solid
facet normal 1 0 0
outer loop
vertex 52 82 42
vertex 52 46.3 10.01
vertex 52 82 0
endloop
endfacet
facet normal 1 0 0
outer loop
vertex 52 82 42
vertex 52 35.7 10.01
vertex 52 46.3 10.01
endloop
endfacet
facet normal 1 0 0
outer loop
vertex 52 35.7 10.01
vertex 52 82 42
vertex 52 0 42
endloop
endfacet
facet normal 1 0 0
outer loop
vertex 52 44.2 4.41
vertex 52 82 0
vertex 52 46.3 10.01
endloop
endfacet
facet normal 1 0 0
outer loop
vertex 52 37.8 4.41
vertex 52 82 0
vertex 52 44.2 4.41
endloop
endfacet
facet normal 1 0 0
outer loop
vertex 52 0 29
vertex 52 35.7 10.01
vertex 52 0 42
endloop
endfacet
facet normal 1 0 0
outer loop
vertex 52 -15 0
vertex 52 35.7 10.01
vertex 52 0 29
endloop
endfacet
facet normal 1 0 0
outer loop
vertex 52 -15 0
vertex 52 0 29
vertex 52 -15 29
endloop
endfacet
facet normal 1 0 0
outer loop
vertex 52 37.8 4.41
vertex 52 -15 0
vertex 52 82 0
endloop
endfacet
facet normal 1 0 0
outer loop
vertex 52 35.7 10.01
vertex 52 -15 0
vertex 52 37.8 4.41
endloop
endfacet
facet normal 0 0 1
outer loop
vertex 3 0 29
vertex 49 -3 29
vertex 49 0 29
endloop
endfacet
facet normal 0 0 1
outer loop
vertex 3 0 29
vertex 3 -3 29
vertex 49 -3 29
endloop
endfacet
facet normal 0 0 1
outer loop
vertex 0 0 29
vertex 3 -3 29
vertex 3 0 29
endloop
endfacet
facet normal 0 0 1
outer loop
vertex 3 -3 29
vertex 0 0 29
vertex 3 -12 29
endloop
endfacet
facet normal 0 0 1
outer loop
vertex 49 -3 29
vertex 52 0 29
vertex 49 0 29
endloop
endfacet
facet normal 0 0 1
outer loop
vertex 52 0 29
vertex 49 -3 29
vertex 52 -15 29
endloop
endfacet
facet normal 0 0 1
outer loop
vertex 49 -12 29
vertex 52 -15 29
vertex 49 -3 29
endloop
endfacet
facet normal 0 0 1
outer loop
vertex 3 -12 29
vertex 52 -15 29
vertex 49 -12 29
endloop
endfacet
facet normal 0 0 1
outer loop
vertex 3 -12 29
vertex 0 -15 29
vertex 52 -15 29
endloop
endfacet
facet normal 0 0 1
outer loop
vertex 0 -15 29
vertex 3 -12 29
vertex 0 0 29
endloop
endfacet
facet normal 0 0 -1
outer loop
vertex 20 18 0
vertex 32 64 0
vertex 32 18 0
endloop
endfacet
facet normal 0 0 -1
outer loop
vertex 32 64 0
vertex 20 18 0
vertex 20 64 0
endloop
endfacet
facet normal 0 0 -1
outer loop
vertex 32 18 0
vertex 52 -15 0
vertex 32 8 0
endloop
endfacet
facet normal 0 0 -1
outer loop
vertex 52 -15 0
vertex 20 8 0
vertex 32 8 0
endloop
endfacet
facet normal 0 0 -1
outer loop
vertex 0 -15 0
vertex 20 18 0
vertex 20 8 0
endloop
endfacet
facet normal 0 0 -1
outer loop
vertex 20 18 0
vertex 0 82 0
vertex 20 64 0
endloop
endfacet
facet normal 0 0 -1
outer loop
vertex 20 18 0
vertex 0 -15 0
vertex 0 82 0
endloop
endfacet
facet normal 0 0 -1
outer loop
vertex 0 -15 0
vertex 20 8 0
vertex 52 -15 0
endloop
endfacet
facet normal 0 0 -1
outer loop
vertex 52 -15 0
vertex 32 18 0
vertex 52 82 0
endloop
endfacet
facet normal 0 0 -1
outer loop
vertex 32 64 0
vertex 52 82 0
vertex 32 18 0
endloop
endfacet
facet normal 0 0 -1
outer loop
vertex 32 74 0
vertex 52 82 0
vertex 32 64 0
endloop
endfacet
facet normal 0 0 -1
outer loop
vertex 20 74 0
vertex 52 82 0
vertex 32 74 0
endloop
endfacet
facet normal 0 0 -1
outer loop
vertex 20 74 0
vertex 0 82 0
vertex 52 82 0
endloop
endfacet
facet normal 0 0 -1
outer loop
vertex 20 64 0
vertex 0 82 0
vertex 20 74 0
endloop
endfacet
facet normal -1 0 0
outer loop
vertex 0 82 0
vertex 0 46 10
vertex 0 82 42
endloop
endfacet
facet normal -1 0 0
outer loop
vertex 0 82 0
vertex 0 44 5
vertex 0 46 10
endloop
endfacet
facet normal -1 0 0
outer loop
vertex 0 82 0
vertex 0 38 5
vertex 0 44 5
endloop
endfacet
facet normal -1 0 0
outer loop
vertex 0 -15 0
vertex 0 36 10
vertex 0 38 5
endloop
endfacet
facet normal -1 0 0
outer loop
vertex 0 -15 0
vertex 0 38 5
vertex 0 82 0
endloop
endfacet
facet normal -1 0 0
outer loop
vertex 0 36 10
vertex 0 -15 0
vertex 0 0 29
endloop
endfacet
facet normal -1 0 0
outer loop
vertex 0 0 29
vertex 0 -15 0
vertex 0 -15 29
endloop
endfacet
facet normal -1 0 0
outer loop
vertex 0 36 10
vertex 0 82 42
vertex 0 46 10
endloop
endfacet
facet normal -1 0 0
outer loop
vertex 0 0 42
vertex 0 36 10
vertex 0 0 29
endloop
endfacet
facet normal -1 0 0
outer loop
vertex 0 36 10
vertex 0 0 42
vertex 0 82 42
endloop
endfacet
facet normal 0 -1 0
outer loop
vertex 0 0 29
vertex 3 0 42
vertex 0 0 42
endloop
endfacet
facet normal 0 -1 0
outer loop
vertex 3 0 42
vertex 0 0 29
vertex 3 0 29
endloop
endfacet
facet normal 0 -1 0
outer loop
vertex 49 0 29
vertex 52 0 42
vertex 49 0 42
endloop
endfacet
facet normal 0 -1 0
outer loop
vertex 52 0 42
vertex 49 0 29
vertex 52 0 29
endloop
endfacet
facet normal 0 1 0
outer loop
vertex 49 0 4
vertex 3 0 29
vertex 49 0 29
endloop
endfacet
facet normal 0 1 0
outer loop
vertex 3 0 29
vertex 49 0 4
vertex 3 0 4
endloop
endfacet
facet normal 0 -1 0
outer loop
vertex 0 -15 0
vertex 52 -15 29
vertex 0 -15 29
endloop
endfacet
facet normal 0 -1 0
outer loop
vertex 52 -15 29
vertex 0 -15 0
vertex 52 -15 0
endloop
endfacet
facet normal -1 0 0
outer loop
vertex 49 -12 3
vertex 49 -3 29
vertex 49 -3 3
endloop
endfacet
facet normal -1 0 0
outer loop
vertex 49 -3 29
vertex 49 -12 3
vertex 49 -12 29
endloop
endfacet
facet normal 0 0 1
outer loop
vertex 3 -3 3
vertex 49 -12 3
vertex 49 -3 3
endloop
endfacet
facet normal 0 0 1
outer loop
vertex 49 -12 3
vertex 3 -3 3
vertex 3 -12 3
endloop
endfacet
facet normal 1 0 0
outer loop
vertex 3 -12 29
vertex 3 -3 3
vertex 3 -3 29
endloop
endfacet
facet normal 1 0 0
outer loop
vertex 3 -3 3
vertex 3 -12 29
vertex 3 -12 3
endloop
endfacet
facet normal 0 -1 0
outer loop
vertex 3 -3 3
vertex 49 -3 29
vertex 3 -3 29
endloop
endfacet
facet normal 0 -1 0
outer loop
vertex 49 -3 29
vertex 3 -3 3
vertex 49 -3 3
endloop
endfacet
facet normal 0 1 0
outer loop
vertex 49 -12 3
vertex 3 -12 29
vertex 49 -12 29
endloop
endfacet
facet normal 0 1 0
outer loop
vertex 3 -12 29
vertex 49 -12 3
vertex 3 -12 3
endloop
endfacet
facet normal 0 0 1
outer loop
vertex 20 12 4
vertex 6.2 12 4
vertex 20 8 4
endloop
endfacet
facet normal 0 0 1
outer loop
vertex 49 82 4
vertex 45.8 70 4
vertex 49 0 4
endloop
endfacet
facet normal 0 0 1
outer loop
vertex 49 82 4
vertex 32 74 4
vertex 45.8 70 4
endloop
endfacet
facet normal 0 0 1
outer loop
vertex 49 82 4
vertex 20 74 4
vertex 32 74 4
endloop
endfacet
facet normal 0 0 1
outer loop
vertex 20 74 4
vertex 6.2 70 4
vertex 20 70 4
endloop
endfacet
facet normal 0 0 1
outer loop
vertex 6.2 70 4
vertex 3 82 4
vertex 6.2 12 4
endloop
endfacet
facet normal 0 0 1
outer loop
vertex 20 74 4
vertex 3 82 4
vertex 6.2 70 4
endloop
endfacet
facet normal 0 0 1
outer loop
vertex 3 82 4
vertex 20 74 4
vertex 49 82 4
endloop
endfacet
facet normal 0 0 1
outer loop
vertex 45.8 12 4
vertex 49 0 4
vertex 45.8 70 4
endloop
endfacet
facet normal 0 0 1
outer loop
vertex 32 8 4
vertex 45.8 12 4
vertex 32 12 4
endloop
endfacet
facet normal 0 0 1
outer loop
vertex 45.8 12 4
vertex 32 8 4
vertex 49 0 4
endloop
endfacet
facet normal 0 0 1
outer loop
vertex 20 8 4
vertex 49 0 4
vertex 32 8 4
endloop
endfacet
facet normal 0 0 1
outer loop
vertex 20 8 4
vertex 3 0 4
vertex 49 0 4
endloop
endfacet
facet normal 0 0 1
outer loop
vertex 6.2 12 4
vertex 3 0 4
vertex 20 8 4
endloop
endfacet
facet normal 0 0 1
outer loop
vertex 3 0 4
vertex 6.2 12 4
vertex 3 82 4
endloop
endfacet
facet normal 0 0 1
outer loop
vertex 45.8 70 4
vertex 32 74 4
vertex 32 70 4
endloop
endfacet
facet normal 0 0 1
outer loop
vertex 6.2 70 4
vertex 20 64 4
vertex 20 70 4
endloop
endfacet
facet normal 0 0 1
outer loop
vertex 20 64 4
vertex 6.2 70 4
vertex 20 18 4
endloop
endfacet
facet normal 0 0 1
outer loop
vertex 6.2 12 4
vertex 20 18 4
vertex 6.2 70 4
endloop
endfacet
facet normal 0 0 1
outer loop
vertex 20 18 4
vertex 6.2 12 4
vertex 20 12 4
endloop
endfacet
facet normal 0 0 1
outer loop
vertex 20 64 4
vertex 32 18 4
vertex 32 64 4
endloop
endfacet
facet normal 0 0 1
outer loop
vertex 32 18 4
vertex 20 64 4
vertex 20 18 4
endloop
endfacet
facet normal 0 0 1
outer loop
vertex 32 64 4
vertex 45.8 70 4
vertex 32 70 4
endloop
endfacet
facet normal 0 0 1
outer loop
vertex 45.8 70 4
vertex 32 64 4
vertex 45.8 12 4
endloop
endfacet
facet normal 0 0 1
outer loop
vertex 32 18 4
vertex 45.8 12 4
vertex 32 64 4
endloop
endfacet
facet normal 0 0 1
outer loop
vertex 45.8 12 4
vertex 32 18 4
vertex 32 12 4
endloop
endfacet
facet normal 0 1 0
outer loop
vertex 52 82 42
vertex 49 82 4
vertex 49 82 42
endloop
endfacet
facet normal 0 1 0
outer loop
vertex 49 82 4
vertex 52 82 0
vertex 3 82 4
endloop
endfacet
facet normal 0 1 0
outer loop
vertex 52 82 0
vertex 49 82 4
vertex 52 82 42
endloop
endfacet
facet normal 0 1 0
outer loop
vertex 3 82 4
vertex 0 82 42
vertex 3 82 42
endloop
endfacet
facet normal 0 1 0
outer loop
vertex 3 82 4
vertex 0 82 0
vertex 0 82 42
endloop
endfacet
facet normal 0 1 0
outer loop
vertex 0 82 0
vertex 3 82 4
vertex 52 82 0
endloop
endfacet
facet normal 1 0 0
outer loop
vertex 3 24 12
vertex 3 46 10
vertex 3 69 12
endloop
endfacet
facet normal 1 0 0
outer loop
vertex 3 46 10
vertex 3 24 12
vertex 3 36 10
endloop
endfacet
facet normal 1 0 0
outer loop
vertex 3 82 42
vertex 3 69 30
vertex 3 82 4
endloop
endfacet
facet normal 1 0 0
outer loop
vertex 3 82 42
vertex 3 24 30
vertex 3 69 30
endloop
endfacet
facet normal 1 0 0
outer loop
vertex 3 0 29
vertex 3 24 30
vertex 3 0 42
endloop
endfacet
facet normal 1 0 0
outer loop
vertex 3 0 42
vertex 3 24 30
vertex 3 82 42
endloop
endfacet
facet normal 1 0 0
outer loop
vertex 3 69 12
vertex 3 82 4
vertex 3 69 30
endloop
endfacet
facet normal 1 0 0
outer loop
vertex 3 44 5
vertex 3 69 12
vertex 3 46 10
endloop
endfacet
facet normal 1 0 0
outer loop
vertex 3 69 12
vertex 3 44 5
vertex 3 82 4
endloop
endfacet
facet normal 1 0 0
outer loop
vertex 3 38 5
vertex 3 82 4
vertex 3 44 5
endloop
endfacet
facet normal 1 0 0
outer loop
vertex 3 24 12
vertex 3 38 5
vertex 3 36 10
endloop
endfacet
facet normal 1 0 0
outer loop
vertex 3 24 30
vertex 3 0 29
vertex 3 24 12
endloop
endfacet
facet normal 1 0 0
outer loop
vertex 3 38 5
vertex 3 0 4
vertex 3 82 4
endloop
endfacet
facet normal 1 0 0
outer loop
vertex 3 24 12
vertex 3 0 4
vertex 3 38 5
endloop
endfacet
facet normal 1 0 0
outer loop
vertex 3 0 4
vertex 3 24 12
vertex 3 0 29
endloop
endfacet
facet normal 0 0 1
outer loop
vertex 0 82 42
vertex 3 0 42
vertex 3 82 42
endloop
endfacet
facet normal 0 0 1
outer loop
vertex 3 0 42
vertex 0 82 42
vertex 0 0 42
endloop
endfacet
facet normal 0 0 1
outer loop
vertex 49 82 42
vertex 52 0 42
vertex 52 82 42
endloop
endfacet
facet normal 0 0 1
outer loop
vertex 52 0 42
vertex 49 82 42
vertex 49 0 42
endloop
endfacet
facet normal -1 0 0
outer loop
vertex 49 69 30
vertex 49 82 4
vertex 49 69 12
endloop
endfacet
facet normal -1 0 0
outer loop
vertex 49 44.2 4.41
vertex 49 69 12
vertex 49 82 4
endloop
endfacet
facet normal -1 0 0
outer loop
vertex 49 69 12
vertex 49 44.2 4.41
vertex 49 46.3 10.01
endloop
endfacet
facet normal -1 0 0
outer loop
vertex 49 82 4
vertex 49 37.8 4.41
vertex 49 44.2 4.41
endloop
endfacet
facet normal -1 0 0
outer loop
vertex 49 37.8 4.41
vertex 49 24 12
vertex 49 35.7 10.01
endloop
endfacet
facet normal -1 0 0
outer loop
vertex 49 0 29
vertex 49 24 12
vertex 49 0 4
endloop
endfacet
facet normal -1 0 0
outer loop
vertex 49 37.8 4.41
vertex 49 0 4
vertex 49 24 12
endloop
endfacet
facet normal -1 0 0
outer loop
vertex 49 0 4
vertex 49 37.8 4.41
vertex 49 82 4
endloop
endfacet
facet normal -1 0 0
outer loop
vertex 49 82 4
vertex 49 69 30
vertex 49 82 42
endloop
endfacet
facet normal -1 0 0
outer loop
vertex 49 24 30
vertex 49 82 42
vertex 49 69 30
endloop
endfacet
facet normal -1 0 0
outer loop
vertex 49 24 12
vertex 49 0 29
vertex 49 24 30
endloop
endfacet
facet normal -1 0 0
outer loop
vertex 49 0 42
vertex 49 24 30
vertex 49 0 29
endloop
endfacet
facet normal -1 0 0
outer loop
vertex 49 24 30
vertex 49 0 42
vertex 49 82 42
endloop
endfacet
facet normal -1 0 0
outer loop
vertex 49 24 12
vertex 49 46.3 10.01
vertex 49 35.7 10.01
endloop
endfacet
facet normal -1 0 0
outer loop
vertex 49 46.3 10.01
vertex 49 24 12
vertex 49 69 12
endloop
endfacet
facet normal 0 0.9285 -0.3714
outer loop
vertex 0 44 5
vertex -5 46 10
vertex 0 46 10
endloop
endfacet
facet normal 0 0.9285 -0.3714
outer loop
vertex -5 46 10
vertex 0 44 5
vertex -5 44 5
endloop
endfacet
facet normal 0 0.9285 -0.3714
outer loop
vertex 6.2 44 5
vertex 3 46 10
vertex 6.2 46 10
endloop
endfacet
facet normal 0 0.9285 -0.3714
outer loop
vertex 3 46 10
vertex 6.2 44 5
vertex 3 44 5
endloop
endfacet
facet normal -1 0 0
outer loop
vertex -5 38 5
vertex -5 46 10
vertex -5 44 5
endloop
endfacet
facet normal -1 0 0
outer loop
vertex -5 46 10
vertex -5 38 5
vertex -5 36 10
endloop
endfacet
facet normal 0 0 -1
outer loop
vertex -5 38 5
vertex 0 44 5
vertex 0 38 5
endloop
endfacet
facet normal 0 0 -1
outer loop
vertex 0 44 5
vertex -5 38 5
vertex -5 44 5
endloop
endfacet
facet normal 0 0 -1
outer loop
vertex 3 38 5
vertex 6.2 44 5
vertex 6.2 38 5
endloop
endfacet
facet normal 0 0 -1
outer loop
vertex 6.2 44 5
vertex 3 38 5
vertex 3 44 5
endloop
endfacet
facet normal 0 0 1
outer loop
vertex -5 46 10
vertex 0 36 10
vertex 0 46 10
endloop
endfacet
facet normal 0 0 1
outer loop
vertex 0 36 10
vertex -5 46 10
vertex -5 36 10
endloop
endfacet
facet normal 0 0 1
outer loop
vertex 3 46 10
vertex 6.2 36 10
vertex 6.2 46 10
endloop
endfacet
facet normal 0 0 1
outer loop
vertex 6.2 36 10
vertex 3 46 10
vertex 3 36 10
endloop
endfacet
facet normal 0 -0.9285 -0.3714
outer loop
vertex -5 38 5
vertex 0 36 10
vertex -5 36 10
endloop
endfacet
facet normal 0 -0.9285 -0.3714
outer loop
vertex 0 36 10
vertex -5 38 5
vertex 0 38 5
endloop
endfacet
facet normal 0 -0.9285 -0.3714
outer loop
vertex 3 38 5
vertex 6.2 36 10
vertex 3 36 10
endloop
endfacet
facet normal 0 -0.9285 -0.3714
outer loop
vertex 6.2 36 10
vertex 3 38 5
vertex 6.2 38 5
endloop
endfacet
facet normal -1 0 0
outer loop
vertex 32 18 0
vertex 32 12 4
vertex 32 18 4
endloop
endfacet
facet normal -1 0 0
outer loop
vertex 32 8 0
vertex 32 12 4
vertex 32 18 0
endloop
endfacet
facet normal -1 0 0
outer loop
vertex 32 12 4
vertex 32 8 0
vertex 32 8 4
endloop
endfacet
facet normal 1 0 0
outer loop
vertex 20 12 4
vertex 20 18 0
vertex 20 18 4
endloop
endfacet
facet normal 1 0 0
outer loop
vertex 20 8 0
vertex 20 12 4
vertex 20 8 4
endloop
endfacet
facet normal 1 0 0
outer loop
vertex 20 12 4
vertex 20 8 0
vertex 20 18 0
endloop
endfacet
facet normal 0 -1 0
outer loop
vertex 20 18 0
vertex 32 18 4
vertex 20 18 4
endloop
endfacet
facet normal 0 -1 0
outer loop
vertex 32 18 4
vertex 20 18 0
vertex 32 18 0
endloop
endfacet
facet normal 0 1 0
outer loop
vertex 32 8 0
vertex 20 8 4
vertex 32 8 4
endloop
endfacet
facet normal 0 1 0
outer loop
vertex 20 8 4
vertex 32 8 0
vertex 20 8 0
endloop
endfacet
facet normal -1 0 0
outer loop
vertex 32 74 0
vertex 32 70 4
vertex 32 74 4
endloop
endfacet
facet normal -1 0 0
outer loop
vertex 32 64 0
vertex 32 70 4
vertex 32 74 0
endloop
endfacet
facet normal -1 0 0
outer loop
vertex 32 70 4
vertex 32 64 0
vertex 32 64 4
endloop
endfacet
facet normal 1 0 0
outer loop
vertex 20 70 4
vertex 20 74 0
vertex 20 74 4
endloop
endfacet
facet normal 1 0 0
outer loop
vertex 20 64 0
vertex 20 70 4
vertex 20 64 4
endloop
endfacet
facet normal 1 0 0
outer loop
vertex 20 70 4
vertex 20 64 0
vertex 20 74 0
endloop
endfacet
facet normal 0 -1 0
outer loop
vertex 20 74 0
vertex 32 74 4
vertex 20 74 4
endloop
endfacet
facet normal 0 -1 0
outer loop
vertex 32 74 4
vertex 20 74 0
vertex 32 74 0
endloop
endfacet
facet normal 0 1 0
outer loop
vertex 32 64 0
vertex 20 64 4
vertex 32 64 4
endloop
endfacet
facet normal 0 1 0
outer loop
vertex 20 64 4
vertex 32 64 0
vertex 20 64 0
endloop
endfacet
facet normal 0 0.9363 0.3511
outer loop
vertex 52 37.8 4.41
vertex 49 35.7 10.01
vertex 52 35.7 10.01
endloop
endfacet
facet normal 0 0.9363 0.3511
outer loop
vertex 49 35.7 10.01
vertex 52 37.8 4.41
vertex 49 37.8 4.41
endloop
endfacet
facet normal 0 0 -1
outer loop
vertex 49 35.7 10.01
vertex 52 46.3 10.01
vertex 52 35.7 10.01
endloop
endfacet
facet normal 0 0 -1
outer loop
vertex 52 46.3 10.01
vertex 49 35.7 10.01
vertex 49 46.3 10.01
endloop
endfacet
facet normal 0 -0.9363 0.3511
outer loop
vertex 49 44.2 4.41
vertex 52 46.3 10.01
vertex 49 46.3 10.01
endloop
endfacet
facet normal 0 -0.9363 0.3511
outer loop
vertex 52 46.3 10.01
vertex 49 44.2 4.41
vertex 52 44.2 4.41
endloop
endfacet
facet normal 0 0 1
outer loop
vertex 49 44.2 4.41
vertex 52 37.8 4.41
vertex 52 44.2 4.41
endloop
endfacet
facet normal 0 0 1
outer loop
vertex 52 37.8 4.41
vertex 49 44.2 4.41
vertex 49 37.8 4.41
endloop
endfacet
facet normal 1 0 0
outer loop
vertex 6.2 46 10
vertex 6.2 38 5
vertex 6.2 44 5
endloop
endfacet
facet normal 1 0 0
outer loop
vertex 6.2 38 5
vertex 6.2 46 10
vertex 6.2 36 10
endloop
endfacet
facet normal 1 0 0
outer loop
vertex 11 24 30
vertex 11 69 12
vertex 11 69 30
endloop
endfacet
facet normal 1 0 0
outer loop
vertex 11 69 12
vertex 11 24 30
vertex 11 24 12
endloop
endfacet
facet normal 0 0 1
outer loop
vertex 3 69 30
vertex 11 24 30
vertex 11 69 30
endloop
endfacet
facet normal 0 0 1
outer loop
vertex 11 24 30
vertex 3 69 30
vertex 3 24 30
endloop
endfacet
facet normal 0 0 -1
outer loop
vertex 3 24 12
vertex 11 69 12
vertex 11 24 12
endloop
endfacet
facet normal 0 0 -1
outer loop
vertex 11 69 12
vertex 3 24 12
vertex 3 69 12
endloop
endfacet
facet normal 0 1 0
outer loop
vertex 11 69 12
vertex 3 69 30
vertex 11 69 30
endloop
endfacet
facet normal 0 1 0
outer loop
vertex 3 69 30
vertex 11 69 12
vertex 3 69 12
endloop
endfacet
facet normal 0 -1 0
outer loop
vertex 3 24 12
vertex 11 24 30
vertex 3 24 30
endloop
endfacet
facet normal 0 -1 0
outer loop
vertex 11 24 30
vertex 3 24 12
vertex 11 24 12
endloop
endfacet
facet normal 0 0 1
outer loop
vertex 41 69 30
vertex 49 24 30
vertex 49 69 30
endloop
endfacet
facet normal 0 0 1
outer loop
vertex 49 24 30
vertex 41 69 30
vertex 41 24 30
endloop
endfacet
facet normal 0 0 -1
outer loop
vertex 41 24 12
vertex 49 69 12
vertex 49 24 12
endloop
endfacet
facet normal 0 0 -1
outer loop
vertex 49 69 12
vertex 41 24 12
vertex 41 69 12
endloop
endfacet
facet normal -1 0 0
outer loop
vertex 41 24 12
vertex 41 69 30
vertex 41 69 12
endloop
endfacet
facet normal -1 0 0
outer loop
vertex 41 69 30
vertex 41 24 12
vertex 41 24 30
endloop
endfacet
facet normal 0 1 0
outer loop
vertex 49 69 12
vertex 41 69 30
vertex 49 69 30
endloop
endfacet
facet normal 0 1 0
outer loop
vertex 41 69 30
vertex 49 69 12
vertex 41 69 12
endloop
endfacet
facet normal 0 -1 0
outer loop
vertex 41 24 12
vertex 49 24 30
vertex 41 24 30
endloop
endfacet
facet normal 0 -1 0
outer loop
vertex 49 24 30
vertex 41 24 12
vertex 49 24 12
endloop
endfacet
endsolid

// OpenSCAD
// Modular Wireless Holder V0.1
// Parametric OpenSCAD prototype for:
// - Shure SLXD UniSlot (SLXD1 or SLXD2, one device at a time)
// - MIPRO ACT-5/7 UniSlot
// - Sennheiser EK IEM G4
// - Electronic tag dummy
// - Horizontal dovetail connector
// - Front/rear bridge connector
//
// NOTE: These are TEST FIT parts based on published nominal dimensions.
// Measure real devices before final print.

$fn = 64;

clearance = 0.6;
wall = 3.0;
floor_t = 4.0;
module_w = 52.0;
module_d = 82.0;
module_h = 42.0;
tag_h = 26.0;
tag_d = 9.0;

rail_h = 18.0;
rail_depth = 5.0;
rail_taper = 2.0;

bridge_socket_w = 12.0;
bridge_socket_h = 7.0;
bridge_socket_d = 10.0;

module dovetail_male(len=rail_h){
    linear_extrude(height=len)
        polygon(points=[
            [0,0],
            [rail_depth,rail_taper],
            [rail_depth,10-rail_taper],
            [0,10]
        ]);
}

module dovetail_female(len=rail_h){
    translate([-0.01,0,0])
    linear_extrude(height=len)
        polygon(points=[
            [0,-0.3],
            [rail_depth+0.6,rail_taper-0.2],
            [rail_depth+0.6,10-rail_taper+0.2],
            [0,10.3]
        ]);
}

module tag_bay(){
    difference(){
        cube([module_w, tag_d+wall*2, tag_h+wall], center=false);
        translate([wall,wall,wall])
            cube([module_w-2*wall, tag_d, tag_h], center=false);
    }
}

module base_shell(){
    difference(){
        union(){
            cube([module_w,module_d,floor_t], center=false);
            cube([wall,module_d,module_h], center=false);
            translate([module_w-wall,0,0])
                cube([wall,module_d,module_h], center=false);
            translate([0,-(tag_d+wall*2),0]) tag_bay();

            translate([-rail_depth, module_d/2-5, floor_t+6])
                rotate([0,90,0]) dovetail_male(rail_h);
        }

        translate([module_w-wall-0.01, module_d/2-5, floor_t+6])
            rotate([0,90,0]) dovetail_female(rail_h);

        for (yy=[8,module_d-8-bridge_socket_d])
            translate([module_w/2-bridge_socket_w/2,yy,0])
                cube([bridge_socket_w,bridge_socket_d,bridge_socket_h], center=false);
    }
}

module rear_bridge(){
    union(){
        cube([bridge_socket_w-0.4,28,bridge_socket_h-0.4], center=false);
        translate([-4,10,0]) cube([bridge_socket_w+8,8,bridge_socket_h-0.4], center=false);
    }
}

module endcap_left(){
    difference(){
        cube([10,module_d,module_h], center=false);
        translate([10-wall, module_d/2-5, floor_t+6])
            rotate([0,90,0]) dovetail_female(rail_h);
    }
}

module endcap_right(){
    union(){
        cube([10,module_d,module_h], center=false);
        translate([-rail_depth, module_d/2-5, floor_t+6])
            rotate([0,90,0]) dovetail_male(rail_h);
    }
}

// Shure published nominal:
// SLXD1 = 98 x 68 x 25.5 mm
// SLXD2 = 37.1 mm dia x 176 mm
// IMPORTANT: one device at a time.
module shure_unislot(){
    difference(){
        base_shell();

        translate([module_w/2, module_d/2+6, module_h-4])
            rotate([90,0,0])
            cylinder(h=module_d-16, d=39.0+clearance, center=true);

        translate([module_w/2-(39+clearance)/2,12,floor_t])
            cube([39+clearance,module_d-24,module_h+20], center=false);

        translate([(module_w-(25.5+clearance))/2,20,floor_t+5])
            cube([25.5+clearance,50,30], center=false);
    }

    shelf_w = 8;
    translate([wall,24,floor_t+8])
        cube([shelf_w,45,18], center=false);
    translate([module_w-wall-shelf_w,24,floor_t+8])
        cube([shelf_w,45,18], center=false);
}

// MIPRO ACT-700 published nominal:
// handheld = 51 mm dia x 272 mm
// bodypack = 63 x 80 x 25 mm
// ACT-5/7 real units still need verification.
// IMPORTANT: one device at a time.
module mipro_unislot(){
    difference(){
        base_shell();

        translate([module_w/2, module_d/2+6, module_h-3])
            rotate([90,0,0])
            cylinder(h=module_d-16, d=52.5+clearance, center=true);

        translate([module_w/2-(52.5+clearance)/2,10,floor_t])
            cube([52.5+clearance,module_d-20,module_h+22], center=false);

        translate([(module_w-(25+clearance))/2,18,floor_t+5])
            cube([25+clearance,54,30], center=false);
    }

    shelf_w = 8;
    translate([wall,22,floor_t+8])
        cube([shelf_w,48,18], center=false);
    translate([module_w-wall-shelf_w,22,floor_t+8])
        cube([shelf_w,48,18], center=false);
}

// Sennheiser EK IEM G4 published approx 82 x 64 x 24 mm.
module g4_slot(){
    difference(){
        base_shell();

        translate([(module_w-(24+clearance))/2,15,floor_t+4])
            cube([24+clearance,56,module_h+8], center=false);
    }

    lip = 6;
    translate([wall,18,floor_t+5])
        cube([lip,50,20], center=false);
    translate([module_w-wall-lip,18,floor_t+5])
        cube([lip,50,20], center=false);
}

module tag_dummy(){
    difference(){
        cube([module_w-4, tag_d, tag_h-4], center=false);
        translate([2,2,2])
            cube([module_w-8, tag_d, tag_h-8], center=false);
    }
}

part = "shure"; // shure, mipro, g4, bridge, tag, leftcap, rightcap

if (part=="shure") shure_unislot();
if (part=="mipro") mipro_unislot();
if (part=="g4") g4_slot();
if (part=="bridge") rear_bridge();
if (part=="tag") tag_dummy();
if (part=="leftcap") endcap_left();
if (part=="rightcap") endcap_right();
